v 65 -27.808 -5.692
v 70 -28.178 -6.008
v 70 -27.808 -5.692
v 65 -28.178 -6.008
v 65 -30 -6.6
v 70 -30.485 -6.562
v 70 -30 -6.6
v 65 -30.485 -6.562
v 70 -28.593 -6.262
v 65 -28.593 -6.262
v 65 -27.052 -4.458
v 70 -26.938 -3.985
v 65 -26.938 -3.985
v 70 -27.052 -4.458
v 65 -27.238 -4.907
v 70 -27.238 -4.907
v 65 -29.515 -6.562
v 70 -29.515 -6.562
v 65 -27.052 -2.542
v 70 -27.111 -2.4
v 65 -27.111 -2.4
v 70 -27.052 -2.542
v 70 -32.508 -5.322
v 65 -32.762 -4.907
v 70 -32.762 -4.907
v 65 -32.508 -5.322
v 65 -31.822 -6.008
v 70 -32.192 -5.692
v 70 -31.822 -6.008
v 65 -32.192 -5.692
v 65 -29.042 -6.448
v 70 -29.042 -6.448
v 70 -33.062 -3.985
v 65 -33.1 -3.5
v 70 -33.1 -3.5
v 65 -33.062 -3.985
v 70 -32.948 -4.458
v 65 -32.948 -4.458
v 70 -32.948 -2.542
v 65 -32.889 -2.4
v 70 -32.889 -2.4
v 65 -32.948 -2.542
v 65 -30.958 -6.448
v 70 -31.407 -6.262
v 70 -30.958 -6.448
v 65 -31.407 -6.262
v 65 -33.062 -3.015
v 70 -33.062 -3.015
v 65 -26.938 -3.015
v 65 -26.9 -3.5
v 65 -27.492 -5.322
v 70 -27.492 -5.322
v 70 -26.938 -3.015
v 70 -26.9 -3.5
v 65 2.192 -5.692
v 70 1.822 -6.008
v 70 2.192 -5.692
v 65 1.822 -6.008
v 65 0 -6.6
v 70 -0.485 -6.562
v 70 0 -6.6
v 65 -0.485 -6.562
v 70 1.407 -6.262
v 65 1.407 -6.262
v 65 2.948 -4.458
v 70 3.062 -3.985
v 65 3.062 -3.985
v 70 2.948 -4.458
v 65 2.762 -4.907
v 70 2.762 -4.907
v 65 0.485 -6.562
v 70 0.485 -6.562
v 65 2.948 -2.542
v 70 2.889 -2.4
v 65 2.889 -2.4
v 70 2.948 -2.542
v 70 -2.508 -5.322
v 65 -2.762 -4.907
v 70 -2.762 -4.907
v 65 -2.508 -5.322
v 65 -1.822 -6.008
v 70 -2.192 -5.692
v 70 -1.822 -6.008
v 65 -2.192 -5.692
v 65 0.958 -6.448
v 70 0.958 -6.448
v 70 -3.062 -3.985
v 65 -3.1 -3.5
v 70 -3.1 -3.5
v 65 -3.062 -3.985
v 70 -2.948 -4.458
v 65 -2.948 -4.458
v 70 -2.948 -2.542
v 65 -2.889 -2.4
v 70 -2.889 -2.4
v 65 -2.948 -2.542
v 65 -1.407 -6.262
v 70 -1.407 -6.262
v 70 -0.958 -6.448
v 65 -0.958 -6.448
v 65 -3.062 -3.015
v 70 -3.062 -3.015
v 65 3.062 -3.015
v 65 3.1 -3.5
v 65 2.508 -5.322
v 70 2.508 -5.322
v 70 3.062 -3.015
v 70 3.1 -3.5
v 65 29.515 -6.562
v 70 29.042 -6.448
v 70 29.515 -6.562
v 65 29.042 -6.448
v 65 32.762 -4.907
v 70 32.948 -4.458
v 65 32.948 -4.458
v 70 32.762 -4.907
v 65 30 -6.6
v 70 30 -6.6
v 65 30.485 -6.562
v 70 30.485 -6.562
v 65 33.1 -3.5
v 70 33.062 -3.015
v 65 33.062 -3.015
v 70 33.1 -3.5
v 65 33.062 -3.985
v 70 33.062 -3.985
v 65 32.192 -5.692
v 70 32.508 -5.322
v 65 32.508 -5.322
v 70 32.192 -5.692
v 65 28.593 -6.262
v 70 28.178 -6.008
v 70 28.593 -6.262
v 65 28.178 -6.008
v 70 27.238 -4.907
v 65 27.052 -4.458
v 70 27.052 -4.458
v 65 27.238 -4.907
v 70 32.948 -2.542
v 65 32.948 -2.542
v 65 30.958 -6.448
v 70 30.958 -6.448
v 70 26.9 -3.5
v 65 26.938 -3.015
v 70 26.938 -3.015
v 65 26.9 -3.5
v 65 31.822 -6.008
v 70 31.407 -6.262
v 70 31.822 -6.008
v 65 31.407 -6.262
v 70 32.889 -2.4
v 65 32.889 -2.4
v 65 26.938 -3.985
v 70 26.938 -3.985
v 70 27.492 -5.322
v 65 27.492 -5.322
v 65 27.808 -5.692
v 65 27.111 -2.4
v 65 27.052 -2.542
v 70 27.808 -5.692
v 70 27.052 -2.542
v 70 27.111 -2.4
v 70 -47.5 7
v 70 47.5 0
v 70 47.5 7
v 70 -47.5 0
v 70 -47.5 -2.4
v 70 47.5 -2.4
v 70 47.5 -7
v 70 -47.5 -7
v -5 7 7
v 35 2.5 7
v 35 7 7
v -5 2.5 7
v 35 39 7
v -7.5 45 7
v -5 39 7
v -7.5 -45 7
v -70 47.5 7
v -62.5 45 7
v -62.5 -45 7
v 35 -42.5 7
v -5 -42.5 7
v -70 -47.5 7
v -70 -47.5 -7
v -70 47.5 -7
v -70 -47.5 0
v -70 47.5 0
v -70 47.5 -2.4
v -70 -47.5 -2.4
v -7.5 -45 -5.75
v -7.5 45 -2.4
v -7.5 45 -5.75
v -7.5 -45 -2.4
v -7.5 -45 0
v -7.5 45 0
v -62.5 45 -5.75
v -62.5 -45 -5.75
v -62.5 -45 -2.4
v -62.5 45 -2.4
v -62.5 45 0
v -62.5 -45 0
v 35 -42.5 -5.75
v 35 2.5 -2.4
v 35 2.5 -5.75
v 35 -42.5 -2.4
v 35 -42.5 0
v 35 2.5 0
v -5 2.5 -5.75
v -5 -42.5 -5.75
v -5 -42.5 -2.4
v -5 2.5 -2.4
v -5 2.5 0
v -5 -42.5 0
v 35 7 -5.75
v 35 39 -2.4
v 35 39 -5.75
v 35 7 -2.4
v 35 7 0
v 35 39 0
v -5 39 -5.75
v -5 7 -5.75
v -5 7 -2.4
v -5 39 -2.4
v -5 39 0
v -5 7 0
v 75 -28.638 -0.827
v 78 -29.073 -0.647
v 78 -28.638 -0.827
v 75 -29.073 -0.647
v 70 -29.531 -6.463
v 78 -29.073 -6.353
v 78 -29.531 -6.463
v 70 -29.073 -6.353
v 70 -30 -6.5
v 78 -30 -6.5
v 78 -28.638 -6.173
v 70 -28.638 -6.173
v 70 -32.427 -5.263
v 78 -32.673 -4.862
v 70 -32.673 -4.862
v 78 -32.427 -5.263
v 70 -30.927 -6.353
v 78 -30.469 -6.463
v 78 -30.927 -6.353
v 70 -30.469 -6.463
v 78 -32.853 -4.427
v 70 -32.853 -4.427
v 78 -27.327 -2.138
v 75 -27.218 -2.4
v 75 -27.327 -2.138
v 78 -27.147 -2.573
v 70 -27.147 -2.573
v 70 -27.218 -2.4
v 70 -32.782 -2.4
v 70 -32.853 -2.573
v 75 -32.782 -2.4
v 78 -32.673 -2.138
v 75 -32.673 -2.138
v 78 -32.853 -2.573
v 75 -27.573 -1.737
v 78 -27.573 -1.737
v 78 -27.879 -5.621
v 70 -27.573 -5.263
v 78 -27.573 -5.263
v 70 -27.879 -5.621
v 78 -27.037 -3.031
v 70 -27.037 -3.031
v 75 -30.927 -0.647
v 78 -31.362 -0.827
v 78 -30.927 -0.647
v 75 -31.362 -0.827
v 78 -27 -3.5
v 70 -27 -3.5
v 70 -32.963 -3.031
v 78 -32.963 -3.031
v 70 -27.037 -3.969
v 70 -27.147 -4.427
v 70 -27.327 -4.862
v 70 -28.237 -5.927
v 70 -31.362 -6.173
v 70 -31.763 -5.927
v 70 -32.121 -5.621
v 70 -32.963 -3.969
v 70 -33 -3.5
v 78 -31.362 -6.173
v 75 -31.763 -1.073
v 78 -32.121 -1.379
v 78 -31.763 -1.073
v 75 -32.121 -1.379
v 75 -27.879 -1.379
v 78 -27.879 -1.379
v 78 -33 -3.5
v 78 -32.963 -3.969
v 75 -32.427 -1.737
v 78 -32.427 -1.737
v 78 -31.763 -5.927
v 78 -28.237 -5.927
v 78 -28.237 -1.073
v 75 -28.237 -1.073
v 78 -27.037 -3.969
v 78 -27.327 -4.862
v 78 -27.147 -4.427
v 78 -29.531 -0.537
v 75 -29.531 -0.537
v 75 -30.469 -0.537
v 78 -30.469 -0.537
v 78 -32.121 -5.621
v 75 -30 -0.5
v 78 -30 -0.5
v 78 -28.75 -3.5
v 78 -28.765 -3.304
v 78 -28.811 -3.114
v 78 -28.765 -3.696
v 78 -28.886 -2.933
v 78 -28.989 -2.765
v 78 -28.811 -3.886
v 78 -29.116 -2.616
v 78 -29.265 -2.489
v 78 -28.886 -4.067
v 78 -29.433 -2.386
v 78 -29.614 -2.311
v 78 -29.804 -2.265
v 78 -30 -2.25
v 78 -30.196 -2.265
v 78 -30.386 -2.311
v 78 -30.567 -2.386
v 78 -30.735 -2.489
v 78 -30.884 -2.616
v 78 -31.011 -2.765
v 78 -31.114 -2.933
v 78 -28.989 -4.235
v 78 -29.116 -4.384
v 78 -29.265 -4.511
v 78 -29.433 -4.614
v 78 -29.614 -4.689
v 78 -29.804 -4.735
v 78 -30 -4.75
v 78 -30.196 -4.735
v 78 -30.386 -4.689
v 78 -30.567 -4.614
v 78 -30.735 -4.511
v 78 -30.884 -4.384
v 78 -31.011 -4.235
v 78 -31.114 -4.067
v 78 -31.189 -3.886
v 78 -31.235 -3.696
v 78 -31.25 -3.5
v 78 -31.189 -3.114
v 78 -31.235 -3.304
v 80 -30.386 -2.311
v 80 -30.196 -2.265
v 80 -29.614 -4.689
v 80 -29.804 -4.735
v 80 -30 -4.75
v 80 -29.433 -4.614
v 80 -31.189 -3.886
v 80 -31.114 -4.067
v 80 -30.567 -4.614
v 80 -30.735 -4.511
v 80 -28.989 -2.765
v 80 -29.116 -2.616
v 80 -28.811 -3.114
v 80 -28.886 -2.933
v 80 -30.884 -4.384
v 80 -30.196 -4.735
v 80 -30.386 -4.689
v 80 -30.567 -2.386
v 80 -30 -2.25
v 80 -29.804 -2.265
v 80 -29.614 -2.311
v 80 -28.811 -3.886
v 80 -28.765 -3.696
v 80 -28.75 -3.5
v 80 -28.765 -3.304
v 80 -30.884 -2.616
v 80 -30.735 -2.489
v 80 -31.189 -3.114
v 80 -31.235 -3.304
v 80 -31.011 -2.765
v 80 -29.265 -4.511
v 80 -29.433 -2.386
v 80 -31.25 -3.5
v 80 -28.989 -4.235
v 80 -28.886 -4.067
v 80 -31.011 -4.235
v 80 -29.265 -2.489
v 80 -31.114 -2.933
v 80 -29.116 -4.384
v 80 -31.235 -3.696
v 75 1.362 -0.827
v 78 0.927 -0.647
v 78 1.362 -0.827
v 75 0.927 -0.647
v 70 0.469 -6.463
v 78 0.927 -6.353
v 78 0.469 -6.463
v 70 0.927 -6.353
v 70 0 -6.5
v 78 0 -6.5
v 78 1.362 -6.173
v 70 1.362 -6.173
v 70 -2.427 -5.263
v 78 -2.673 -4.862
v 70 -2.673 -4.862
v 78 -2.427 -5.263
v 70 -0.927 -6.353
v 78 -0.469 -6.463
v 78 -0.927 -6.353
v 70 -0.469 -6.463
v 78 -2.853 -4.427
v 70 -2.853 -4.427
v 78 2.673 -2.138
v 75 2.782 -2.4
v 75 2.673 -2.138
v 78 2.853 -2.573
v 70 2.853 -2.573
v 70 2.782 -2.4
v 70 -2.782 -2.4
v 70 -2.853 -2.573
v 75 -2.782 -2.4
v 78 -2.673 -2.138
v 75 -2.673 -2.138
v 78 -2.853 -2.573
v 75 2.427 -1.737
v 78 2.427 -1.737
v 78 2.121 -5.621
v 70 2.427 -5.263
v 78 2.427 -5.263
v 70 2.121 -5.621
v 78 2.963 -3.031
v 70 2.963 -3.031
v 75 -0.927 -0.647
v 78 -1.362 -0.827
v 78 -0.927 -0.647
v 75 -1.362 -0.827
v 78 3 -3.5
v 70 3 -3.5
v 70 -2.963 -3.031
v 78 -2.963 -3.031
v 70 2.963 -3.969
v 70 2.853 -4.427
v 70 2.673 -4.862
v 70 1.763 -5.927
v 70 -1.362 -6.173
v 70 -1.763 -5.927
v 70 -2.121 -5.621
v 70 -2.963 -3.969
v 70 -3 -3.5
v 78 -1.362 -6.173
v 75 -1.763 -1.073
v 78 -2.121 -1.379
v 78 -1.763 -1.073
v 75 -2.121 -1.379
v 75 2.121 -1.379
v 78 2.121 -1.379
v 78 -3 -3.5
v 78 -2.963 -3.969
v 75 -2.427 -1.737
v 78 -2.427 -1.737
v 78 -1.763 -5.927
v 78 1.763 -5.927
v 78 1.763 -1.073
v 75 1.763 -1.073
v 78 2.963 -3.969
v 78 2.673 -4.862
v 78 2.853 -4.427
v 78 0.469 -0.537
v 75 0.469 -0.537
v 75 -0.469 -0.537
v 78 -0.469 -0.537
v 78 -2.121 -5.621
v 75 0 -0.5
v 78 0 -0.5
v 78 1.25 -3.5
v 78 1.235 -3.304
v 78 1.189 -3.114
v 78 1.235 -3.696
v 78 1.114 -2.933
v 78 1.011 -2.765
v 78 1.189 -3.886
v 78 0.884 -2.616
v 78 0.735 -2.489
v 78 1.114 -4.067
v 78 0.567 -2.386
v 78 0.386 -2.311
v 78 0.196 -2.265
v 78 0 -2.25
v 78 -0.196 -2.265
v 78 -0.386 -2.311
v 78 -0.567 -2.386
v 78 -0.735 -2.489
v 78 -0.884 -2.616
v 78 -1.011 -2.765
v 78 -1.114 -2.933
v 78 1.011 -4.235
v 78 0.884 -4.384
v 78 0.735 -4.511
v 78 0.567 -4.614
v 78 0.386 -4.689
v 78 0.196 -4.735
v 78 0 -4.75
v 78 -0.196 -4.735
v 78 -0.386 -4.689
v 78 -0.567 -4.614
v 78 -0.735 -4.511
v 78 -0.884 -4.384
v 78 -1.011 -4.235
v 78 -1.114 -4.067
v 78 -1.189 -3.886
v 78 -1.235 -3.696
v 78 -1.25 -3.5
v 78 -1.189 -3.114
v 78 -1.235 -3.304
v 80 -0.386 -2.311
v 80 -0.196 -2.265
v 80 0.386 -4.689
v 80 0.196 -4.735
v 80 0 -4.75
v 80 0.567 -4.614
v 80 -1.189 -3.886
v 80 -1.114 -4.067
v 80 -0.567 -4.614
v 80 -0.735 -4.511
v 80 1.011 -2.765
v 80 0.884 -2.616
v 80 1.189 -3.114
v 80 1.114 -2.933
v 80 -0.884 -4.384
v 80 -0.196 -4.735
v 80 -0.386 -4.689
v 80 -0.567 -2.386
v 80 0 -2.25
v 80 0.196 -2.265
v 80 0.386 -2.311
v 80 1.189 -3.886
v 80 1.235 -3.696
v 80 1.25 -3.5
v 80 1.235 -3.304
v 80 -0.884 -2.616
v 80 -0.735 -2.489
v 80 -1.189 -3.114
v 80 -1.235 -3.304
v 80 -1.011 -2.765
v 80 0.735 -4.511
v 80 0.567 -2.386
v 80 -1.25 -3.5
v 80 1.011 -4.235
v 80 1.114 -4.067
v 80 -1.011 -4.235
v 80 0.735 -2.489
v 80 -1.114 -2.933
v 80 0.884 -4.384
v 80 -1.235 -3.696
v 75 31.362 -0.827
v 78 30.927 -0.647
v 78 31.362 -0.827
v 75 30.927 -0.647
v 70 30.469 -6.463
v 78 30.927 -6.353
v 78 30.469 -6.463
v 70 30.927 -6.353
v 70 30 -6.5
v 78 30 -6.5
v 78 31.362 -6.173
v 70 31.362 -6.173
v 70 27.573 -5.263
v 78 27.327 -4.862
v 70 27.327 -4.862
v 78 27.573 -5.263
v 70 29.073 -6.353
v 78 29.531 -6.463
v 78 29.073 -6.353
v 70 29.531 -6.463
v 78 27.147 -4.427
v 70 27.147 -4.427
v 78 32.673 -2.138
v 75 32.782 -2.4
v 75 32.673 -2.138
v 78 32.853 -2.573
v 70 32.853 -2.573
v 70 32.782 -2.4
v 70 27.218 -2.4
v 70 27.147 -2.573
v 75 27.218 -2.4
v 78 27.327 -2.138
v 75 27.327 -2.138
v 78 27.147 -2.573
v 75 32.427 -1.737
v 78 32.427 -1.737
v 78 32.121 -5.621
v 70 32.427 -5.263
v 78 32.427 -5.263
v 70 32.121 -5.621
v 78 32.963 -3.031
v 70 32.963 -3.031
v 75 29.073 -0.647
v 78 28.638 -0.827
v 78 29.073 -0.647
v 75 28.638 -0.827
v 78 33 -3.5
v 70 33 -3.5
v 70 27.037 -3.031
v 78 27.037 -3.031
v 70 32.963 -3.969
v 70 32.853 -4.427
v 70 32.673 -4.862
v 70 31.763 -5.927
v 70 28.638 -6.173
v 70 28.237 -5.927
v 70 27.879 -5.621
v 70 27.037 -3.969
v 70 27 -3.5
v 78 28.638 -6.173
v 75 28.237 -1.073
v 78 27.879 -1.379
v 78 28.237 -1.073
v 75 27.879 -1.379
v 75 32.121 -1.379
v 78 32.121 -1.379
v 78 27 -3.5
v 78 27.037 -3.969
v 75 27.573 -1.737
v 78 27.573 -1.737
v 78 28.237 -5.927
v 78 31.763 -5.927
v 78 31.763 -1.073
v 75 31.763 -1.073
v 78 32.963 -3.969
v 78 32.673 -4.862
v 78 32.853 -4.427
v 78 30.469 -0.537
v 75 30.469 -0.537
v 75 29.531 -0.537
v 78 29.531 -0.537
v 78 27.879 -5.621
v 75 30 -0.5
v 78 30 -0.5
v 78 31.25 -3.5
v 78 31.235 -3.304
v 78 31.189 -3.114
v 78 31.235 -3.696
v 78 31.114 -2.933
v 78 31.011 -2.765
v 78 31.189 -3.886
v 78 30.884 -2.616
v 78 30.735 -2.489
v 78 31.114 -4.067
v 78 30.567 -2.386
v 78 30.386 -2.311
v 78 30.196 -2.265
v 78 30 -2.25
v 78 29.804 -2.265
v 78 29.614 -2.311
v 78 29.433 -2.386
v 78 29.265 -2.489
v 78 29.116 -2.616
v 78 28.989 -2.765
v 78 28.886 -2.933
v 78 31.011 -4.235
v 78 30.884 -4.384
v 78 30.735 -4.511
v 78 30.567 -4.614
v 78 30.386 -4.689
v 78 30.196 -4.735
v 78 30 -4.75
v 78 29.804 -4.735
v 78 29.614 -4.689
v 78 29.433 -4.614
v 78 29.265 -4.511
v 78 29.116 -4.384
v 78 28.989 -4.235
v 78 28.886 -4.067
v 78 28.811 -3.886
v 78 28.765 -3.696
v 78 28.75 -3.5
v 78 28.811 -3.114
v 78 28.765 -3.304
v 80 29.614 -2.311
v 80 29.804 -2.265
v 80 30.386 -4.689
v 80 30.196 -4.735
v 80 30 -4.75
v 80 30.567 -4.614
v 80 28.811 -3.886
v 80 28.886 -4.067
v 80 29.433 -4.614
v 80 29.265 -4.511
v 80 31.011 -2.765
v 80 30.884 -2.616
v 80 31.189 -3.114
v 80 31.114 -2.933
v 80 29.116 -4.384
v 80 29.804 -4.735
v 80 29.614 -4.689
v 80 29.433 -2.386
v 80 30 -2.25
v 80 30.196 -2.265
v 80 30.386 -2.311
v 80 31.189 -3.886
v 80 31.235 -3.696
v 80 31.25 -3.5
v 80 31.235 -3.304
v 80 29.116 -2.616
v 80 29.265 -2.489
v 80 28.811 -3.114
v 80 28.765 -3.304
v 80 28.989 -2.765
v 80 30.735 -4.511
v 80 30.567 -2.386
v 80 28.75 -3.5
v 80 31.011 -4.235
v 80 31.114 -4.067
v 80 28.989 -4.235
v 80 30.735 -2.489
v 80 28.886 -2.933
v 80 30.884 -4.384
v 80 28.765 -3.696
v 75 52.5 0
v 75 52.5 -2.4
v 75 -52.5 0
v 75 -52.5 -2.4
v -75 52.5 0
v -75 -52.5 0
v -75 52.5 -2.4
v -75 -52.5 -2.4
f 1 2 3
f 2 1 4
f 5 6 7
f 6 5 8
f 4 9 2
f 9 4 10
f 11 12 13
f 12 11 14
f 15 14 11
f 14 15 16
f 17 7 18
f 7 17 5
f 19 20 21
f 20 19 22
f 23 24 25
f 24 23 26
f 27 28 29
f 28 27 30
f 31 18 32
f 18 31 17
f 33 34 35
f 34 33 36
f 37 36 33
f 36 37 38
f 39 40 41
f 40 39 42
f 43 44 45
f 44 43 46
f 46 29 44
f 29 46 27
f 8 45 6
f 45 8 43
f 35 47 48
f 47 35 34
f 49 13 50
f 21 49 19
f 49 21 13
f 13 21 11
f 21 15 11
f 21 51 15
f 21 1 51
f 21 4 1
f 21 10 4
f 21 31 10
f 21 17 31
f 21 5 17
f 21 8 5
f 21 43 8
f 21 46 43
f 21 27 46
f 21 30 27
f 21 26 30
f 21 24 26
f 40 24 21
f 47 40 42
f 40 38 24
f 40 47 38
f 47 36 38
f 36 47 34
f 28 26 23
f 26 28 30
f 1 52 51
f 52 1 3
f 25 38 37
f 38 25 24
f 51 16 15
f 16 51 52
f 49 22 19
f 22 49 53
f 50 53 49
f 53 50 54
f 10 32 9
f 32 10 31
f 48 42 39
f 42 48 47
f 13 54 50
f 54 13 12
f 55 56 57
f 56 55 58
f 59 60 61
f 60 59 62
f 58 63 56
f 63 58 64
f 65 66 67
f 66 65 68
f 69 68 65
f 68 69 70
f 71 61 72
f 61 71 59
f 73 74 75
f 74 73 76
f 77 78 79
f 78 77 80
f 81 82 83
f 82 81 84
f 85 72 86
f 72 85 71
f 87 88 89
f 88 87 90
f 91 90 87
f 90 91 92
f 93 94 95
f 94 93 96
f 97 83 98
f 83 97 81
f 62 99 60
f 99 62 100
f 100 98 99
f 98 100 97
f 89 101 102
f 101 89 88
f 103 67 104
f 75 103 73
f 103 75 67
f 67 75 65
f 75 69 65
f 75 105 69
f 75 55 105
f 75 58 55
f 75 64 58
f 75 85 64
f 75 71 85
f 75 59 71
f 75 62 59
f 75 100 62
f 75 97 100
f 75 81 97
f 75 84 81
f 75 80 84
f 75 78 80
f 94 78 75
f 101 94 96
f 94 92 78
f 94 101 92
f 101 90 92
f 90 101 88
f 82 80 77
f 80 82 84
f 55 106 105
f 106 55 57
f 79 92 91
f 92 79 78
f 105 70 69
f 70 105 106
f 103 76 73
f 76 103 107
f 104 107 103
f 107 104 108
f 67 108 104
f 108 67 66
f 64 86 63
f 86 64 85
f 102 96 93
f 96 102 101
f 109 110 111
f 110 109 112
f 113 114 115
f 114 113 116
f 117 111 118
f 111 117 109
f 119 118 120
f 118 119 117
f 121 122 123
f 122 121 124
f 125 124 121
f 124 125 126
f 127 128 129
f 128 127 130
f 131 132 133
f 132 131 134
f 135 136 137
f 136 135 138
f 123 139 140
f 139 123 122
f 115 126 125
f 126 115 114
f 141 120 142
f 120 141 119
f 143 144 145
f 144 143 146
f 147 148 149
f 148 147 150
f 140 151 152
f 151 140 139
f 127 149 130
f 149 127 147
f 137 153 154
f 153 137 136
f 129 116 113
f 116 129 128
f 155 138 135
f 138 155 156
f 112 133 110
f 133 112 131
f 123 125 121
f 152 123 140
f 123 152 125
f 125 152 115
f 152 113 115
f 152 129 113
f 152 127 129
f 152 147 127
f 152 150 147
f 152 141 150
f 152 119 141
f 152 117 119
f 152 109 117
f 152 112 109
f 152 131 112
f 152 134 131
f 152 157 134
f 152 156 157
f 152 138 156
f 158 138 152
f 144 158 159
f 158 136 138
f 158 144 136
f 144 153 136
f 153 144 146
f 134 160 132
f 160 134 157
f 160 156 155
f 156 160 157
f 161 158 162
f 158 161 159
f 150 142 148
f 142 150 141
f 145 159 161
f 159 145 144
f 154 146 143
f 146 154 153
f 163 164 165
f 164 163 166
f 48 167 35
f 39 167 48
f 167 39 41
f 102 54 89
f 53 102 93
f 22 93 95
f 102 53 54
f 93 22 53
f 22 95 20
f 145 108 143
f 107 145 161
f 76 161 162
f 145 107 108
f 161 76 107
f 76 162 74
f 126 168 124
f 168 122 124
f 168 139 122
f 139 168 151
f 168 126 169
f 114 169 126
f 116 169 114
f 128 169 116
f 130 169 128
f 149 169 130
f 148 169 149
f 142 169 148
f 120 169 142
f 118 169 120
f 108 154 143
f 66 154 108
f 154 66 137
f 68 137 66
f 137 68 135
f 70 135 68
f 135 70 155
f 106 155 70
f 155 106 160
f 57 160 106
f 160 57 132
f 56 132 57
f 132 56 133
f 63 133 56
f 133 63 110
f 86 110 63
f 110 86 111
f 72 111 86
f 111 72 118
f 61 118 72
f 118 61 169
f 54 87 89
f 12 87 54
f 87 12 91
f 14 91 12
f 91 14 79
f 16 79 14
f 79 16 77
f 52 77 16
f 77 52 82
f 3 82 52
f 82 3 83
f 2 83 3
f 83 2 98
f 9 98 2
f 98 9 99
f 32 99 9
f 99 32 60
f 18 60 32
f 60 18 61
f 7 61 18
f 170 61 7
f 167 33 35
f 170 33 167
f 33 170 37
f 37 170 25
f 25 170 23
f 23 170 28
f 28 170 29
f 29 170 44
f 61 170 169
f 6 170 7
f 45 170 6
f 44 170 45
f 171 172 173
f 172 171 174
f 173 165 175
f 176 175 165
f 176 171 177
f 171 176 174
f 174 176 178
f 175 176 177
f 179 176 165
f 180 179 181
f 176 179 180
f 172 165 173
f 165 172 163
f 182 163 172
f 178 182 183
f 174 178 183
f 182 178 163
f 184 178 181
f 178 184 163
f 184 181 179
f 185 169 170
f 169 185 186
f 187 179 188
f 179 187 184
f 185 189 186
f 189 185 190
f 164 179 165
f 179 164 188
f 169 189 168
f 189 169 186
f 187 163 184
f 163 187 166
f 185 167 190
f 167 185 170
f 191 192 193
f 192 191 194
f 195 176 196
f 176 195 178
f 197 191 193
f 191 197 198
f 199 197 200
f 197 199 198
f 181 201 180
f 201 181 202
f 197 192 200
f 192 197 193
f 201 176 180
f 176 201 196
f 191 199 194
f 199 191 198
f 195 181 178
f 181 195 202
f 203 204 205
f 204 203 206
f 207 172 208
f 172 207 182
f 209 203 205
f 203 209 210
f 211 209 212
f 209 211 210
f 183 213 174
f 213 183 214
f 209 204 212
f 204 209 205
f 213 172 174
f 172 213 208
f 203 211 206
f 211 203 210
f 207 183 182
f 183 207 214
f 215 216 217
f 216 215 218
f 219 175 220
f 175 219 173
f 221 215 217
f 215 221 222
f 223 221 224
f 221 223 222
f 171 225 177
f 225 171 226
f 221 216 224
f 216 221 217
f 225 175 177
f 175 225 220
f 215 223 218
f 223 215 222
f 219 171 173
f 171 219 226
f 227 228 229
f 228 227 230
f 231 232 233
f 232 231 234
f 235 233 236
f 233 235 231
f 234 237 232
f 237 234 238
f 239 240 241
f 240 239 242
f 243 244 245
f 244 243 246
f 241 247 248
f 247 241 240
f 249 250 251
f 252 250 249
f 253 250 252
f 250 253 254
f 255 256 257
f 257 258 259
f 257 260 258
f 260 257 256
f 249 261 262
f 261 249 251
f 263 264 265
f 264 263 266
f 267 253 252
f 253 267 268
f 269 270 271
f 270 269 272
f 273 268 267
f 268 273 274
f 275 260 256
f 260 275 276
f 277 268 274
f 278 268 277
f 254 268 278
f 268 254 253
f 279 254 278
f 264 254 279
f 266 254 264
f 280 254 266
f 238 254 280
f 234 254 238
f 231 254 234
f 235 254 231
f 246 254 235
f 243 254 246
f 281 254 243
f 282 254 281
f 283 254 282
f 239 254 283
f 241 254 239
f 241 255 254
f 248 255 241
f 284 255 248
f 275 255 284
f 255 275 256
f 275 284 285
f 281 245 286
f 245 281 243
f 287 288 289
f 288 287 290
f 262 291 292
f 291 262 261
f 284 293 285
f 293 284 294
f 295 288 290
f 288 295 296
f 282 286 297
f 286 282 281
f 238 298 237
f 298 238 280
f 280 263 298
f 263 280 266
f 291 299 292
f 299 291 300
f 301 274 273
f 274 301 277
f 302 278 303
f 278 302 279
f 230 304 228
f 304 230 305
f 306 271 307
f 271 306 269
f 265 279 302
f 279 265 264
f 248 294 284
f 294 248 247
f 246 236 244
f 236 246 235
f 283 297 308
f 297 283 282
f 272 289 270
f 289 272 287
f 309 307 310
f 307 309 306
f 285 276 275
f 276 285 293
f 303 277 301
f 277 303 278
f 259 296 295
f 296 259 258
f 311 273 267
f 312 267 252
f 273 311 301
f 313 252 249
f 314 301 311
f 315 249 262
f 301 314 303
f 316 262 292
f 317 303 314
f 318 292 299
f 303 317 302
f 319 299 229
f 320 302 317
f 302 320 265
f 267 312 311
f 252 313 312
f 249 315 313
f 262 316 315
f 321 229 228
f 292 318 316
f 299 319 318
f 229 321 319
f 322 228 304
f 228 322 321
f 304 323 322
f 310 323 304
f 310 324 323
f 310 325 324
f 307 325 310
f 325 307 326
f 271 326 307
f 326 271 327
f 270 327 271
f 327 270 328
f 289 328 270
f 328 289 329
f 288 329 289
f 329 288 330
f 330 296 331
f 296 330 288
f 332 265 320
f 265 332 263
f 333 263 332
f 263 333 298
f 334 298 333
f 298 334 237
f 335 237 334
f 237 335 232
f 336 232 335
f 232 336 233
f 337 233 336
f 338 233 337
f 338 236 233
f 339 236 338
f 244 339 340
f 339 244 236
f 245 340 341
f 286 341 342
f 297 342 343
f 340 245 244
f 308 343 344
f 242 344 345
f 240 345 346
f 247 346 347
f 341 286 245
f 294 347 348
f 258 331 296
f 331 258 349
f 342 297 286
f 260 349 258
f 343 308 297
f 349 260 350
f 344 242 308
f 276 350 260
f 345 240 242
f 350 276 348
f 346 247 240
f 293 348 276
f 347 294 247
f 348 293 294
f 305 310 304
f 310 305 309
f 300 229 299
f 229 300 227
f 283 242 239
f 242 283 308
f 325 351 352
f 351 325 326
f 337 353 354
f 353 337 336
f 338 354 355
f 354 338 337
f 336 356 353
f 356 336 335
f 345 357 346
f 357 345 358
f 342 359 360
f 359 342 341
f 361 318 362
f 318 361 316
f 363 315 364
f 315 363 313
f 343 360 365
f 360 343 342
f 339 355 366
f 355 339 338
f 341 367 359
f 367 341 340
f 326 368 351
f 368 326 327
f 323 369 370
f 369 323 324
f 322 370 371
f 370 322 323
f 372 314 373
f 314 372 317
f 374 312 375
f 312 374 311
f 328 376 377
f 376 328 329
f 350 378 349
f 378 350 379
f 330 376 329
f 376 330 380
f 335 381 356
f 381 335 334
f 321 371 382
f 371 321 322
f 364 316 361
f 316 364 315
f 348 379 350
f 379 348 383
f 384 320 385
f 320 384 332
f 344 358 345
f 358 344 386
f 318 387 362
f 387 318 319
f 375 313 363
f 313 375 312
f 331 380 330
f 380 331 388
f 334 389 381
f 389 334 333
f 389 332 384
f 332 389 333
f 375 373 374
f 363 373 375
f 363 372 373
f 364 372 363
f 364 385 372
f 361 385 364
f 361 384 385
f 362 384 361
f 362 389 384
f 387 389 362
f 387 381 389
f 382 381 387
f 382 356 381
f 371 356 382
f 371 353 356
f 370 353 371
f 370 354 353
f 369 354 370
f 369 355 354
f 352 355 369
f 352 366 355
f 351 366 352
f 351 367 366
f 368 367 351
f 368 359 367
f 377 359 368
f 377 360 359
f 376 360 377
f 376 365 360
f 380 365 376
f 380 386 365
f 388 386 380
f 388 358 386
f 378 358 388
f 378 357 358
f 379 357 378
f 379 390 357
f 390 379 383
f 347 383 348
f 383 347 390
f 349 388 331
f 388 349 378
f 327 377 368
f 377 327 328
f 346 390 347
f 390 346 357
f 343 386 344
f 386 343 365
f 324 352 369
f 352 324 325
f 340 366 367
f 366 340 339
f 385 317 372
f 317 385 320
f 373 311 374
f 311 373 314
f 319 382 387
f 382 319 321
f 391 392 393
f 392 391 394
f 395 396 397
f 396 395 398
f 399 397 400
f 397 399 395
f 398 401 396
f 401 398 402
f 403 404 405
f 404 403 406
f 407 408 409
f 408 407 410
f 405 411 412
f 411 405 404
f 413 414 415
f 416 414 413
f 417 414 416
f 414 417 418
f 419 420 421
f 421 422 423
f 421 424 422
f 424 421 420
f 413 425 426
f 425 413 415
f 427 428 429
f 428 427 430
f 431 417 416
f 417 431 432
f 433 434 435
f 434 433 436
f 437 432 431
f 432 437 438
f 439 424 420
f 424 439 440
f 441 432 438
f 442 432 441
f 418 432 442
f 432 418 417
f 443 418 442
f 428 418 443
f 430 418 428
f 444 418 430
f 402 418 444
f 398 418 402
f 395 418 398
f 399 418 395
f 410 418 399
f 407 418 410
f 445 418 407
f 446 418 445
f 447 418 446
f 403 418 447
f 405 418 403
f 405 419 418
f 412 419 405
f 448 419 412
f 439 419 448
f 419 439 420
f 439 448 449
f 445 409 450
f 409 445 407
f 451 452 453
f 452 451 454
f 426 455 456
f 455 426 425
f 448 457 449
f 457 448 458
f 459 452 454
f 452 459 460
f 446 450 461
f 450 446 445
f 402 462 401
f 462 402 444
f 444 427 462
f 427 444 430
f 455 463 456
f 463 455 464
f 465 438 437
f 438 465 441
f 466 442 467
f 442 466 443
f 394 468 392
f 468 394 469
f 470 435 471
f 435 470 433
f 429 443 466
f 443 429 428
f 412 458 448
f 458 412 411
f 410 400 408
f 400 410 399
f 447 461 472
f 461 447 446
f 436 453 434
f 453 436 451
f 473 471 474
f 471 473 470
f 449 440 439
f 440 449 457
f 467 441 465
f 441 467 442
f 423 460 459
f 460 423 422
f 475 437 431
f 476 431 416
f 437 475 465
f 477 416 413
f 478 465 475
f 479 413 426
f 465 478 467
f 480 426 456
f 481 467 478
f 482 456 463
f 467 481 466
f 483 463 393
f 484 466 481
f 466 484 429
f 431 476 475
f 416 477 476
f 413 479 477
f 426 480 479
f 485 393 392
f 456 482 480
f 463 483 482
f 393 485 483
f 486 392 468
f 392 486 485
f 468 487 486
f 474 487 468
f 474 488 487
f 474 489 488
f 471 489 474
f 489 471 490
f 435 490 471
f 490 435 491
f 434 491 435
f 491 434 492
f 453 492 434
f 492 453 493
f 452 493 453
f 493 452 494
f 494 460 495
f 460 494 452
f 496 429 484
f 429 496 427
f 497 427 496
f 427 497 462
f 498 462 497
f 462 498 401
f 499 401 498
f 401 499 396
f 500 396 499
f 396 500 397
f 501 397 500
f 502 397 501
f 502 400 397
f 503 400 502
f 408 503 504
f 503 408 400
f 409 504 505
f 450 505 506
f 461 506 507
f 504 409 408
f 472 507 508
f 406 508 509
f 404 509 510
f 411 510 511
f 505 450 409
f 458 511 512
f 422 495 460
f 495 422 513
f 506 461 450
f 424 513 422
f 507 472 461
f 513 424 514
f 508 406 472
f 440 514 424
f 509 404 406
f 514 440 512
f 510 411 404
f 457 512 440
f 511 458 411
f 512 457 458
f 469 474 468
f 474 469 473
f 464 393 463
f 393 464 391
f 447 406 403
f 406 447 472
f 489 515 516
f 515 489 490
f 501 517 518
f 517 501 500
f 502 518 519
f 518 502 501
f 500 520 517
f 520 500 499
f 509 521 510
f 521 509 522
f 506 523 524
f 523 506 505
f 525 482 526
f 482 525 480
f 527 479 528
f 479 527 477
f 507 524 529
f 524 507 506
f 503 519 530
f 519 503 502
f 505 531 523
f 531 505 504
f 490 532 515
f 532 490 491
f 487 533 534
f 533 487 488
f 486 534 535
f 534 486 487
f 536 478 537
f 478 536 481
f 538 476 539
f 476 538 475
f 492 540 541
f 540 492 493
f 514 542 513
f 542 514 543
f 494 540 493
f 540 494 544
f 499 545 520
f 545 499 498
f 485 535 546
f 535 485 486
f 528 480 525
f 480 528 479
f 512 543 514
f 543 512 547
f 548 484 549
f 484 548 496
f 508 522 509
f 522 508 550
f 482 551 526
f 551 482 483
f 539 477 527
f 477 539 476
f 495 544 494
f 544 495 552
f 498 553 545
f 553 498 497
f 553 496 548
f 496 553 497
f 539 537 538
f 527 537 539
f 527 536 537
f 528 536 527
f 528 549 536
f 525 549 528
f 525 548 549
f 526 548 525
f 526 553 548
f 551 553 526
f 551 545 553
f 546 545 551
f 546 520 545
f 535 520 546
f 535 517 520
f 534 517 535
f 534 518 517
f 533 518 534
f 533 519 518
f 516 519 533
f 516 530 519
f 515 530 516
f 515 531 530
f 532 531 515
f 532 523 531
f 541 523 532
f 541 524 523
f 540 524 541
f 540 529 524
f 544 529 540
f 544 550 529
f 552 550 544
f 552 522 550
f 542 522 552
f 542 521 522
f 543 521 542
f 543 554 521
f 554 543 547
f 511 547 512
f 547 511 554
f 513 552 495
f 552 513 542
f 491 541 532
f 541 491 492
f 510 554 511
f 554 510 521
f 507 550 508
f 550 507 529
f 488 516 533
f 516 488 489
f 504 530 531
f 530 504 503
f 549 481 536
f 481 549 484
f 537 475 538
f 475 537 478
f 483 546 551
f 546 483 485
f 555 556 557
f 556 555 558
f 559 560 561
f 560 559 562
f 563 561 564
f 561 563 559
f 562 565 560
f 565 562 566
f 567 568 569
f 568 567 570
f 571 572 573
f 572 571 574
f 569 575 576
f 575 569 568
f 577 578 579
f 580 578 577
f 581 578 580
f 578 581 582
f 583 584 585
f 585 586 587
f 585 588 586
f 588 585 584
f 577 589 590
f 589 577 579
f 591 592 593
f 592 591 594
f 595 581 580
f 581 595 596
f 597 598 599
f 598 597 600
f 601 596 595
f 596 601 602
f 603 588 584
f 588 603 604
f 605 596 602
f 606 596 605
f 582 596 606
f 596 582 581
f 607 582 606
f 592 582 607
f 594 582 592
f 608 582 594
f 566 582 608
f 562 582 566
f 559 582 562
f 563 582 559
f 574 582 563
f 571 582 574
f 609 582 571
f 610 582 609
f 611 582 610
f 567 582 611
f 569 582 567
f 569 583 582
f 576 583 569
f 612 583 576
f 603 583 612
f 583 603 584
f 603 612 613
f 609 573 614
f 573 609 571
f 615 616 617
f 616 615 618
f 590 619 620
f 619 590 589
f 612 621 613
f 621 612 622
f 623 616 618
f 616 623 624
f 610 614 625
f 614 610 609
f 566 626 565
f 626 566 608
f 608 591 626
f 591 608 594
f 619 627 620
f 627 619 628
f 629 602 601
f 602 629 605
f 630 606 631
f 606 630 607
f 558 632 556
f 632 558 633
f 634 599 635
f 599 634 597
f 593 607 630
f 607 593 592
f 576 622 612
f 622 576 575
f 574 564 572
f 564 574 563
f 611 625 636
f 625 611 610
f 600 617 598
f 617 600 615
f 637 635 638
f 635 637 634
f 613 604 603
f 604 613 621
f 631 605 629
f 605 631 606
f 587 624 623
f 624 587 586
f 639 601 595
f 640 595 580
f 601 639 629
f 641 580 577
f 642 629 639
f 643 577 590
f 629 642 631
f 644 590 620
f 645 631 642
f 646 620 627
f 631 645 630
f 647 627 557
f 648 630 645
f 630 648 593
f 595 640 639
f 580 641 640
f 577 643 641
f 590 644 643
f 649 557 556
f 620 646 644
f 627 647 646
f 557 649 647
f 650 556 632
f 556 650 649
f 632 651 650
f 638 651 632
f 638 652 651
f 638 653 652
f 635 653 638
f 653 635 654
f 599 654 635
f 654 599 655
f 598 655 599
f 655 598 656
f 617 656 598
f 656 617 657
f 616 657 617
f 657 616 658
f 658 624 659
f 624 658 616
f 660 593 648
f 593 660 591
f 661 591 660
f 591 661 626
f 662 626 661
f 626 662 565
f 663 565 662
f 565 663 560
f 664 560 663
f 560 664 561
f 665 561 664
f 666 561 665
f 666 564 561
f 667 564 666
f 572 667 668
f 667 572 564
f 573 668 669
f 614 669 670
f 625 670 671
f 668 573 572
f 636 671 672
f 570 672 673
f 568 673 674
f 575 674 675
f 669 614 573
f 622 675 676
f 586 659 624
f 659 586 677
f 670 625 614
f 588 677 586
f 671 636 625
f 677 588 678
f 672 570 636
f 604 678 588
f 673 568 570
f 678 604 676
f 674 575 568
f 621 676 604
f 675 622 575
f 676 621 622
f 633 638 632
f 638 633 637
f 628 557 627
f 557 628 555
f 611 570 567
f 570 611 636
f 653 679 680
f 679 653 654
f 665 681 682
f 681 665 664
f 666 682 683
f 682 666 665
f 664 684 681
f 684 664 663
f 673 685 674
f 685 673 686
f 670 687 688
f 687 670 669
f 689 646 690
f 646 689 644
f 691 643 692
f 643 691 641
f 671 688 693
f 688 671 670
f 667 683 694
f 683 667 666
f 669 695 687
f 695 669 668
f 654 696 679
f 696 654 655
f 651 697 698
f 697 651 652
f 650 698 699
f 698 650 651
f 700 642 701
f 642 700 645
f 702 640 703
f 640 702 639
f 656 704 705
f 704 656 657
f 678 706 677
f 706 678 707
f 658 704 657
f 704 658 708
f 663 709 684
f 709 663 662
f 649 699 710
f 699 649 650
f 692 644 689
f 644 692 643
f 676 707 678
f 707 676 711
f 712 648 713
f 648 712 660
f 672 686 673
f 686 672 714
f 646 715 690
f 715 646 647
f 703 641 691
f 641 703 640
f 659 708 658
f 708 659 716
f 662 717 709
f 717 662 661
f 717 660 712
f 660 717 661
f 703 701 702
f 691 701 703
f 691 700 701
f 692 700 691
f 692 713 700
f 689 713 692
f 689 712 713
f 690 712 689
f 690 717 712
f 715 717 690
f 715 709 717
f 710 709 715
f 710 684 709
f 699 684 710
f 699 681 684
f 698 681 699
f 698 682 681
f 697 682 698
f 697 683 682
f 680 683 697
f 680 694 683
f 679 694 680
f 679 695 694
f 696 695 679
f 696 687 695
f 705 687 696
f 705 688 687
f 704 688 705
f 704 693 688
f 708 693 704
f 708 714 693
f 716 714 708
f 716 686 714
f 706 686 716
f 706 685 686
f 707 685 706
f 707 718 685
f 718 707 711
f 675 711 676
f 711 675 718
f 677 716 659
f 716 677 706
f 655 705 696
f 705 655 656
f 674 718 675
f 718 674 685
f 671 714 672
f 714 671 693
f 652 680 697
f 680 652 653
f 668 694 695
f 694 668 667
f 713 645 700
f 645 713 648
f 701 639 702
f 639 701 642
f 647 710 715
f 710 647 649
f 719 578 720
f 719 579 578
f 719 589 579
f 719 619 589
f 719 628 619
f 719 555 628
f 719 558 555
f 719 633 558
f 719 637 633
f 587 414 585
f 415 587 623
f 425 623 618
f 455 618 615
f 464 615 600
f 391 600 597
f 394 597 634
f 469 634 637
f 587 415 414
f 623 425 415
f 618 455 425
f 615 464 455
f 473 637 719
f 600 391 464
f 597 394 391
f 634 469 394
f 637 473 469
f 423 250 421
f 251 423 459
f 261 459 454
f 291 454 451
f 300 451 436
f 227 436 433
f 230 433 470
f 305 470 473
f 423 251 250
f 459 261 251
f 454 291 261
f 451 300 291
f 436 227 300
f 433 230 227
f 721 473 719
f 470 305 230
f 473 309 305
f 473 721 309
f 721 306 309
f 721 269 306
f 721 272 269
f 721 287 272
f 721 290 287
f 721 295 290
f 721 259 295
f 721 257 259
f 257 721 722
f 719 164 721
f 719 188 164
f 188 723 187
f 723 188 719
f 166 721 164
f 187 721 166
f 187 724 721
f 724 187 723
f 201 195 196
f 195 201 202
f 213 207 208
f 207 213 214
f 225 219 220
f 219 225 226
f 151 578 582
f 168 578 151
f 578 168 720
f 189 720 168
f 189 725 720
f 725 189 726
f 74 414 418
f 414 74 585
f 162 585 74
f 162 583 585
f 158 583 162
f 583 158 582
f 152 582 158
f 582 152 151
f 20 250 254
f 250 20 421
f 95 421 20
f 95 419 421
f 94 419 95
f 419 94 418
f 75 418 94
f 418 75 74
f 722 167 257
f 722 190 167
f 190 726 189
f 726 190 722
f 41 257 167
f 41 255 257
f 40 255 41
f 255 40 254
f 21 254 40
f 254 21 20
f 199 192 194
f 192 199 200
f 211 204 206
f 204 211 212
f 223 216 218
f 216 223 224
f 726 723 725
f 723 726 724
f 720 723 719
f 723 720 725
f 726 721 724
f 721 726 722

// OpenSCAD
// ========================================================
// F-14F TACTICAL SDR TRANSCEIVER - EMI SHIELDING CAGE
// MULTI-COMPARTMENT ELECTROSTATIC ISOLATION BLOCK
// ========================================================

$fn = 40; // Precision edge smoothing for internal milling paths

// --- SHIELD CAGE PHYSICAL LIMITS (mm) ---
cage_length = 140;
cage_width  = 95;
cage_height = 14;
wall_thick  = 2.5; // Thickness of the internal isolation walls

// --- COLOR PALETTE ---
chromate_gold = [0.78, 0.64, 0.22, 1.0]; // Chemical-film conductive gold finish
pcb_green     = [0.15, 0.45, 0.25, 0.4]; // Translucent underlying circuit board
rf_connector  = [0.82, 0.84, 0.86, 1.0]; // Stainless steel SMA antenna jacks

// ========================================================
// REINFORCED COMPONENT ASSEMBLY GENERATION
// ========================================================

module sdr_electrostatic_shield() {
    // 1. Reference View: Underlying Transceiver Card Substrate
    color(pcb_green)
        translate([0, 0, -1.2])
        cube([cage_length + 10, cage_width + 10, 2.4], center=true);

    // 2. CNC-Milled Multi-Cavity Shield Structure
    color(chromate_gold)
    difference() {
        // Main solid block frame envelope
        cube([cage_length, cage_width, cage_height], center=true);
        
        // Cavity A: Power Amplifier Section (Isolates high-power output heat/noise)
        translate([-35, 0, wall_thick/2])
            cube([55, cage_width - (wall_thick*2), cage_height], center=true);
            
        // Cavity B: Low Noise Amplifier & Receiver Section
        translate([15, -20, wall_thick/2])
            cube([40, 45, cage_height], center=true);
            
        // Cavity C: Digital Processing & Frequency-Hopping Clock Sync Section
        translate([15, 23, wall_thick/2])
            cube([40, 32, cage_height], center=true);
            
        // Rear punch-outs for edge-mounted SMA RF coaxial antenna jacks
        for (y_conn = [-30, 0, 30]) {
            translate([cage_length/2, y_conn, -cage_height/4])
                rotate([0, 90, 0]) cylinder(d=6.2, h=10, center=true);
        }
    }
    
    // 3. Hardware Assembly Feature: Threaded SMA Coaxial Plugs
    color(rf_connector) {
        for (y_conn = [-30, 0, 30]) {
            translate([cage_length/2 + 4, y_conn, -cage_height/4])
                rotate([0, 90, 0]) {
                    cylinder(d=6.0, h=8, center=true); // Connector barrel
                    translate([0, 0, 4]) cylinder(d=2.5, h=4, center=true); // Center conductor pin
                }
        }
    }
}

// Execute active structural rendering view
sdr_electrostatic_shield();
